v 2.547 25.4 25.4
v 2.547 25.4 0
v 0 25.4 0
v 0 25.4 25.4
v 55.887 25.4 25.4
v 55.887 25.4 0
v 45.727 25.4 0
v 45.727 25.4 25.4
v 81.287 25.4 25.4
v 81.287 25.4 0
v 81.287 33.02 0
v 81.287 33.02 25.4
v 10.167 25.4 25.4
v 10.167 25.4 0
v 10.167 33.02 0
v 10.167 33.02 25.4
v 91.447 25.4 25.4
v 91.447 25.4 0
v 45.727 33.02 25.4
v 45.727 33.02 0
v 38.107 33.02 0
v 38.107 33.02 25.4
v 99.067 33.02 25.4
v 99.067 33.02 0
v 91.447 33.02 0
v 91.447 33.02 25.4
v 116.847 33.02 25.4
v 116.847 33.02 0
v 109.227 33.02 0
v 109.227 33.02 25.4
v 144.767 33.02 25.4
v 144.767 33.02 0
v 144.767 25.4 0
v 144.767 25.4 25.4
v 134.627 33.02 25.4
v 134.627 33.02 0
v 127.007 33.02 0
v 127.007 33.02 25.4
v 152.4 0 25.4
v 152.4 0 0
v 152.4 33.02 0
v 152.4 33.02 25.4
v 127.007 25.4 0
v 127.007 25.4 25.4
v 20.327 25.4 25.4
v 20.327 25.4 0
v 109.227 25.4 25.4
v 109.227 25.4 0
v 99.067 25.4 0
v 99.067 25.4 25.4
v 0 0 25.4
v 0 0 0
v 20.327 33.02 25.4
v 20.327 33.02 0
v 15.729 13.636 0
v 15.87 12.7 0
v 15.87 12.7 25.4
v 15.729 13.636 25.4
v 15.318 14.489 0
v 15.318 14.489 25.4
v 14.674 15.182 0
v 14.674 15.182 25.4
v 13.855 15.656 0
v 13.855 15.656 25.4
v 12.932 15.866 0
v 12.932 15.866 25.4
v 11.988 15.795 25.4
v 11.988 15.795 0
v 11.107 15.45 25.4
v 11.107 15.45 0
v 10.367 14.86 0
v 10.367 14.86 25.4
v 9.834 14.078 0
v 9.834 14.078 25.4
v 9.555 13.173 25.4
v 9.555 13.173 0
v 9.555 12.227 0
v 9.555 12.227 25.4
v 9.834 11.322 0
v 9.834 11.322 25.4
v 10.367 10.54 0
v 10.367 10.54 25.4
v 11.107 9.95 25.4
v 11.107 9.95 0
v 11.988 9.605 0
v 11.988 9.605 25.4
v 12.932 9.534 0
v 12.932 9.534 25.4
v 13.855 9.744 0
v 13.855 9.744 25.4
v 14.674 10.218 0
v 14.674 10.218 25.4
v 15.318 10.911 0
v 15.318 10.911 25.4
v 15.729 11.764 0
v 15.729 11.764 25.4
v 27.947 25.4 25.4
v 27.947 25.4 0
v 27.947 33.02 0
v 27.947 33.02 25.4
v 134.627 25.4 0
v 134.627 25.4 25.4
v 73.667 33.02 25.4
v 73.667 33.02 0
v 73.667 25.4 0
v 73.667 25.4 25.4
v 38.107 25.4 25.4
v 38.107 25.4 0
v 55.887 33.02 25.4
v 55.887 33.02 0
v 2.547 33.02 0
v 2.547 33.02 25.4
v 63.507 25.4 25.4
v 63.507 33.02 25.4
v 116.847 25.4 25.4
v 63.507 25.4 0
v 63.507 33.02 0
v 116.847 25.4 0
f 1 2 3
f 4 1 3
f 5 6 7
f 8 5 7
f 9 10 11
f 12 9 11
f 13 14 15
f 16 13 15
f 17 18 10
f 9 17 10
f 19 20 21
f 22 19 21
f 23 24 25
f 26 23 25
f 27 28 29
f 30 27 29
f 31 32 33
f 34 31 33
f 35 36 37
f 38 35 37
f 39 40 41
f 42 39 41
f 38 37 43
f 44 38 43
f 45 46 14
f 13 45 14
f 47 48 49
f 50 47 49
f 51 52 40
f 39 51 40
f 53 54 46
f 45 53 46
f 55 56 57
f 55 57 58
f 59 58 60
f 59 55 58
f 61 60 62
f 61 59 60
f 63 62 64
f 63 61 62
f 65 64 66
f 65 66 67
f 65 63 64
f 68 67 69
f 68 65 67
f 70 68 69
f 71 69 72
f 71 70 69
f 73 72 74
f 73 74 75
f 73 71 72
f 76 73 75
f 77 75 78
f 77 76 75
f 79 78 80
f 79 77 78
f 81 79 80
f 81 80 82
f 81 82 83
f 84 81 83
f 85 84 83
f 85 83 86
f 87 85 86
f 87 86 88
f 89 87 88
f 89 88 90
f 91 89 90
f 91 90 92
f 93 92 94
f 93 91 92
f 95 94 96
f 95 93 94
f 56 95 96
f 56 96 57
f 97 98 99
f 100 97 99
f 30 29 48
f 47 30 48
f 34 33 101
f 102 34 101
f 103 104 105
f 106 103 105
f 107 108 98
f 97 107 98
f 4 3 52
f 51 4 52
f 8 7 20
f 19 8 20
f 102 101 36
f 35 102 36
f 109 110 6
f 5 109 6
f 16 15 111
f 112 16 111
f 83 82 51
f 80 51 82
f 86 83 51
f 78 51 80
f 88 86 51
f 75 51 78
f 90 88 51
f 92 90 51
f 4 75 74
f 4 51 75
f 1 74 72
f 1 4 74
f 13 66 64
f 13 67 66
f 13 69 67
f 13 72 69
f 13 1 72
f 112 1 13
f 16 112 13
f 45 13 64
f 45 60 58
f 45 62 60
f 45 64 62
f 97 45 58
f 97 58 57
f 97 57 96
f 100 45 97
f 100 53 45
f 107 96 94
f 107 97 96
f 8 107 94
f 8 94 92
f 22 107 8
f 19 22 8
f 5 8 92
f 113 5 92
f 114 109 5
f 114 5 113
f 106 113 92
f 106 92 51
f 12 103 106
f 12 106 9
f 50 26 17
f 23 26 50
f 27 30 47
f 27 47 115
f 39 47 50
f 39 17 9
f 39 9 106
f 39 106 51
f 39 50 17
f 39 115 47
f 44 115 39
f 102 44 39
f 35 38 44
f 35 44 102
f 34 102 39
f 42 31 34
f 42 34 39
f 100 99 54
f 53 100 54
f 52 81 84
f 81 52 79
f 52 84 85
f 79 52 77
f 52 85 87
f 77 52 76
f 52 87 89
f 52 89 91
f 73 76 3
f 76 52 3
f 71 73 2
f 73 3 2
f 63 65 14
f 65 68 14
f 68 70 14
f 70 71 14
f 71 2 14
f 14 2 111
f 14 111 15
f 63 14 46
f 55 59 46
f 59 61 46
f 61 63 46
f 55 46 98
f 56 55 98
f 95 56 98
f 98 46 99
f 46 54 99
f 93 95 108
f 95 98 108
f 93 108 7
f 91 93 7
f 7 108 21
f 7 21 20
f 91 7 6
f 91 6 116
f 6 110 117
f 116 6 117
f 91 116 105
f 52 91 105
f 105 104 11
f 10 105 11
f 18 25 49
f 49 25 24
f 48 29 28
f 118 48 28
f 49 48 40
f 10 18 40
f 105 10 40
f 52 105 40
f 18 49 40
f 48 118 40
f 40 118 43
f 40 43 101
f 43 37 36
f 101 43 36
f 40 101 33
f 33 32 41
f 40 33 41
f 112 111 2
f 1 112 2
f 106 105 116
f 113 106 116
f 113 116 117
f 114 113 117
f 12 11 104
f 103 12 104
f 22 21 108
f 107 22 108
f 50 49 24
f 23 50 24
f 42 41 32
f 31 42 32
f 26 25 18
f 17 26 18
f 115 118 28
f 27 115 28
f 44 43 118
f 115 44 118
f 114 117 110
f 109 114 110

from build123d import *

# Parameters (mm, degrees)
SKETCH1_R        = 3.175
EXTRUSION2_DEPTH = 25.4


with BuildPart() as part:
    # Sketch1 → Extrusion2 (new body)
    with BuildSketch(Plane.XY):
        Polygon((0, 0), (152.4, 0), (152.4, 25.4), (152.4, 33.02), (144.767375471, 33.02), (144.767375471, 25.4), (134.626900767, 25.4), (134.626900767, 33.02), (127.006900767, 33.02), (127.006900767, 25.4), (116.846900767, 25.4), (116.846900767, 33.02), (109.226900767, 33.02), (109.226900767, 25.4), (99.066900767, 25.4), (99.066900767, 33.02), (91.446900767, 33.02), (91.446900767, 25.4), (81.286900767, 25.4), (81.286900767, 33.02), (73.666900767, 33.02), (73.666900767, 25.4), (63.506900767, 25.4), (63.506900767, 33.02), (55.886900767, 33.02), (55.886900767, 25.4), (45.726900767, 25.4), (45.726900767, 33.02), (38.106900767, 33.02), (38.106900767, 25.4), (27.946900767, 25.4), (27.946900767, 33.02), (20.326900767, 33.02), (20.326900767, 25.4), (10.166900767, 25.4), (10.166900767, 33.02), (2.546900767, 33.02), (2.546900767, 25.4), (0, 25.4), align=None)
        with Locations((12.694659047, 12.7)):
            Circle(SKETCH1_R, mode=Mode.SUBTRACT)
    extrude(amount=EXTRUSION2_DEPTH)


solid = part.part
